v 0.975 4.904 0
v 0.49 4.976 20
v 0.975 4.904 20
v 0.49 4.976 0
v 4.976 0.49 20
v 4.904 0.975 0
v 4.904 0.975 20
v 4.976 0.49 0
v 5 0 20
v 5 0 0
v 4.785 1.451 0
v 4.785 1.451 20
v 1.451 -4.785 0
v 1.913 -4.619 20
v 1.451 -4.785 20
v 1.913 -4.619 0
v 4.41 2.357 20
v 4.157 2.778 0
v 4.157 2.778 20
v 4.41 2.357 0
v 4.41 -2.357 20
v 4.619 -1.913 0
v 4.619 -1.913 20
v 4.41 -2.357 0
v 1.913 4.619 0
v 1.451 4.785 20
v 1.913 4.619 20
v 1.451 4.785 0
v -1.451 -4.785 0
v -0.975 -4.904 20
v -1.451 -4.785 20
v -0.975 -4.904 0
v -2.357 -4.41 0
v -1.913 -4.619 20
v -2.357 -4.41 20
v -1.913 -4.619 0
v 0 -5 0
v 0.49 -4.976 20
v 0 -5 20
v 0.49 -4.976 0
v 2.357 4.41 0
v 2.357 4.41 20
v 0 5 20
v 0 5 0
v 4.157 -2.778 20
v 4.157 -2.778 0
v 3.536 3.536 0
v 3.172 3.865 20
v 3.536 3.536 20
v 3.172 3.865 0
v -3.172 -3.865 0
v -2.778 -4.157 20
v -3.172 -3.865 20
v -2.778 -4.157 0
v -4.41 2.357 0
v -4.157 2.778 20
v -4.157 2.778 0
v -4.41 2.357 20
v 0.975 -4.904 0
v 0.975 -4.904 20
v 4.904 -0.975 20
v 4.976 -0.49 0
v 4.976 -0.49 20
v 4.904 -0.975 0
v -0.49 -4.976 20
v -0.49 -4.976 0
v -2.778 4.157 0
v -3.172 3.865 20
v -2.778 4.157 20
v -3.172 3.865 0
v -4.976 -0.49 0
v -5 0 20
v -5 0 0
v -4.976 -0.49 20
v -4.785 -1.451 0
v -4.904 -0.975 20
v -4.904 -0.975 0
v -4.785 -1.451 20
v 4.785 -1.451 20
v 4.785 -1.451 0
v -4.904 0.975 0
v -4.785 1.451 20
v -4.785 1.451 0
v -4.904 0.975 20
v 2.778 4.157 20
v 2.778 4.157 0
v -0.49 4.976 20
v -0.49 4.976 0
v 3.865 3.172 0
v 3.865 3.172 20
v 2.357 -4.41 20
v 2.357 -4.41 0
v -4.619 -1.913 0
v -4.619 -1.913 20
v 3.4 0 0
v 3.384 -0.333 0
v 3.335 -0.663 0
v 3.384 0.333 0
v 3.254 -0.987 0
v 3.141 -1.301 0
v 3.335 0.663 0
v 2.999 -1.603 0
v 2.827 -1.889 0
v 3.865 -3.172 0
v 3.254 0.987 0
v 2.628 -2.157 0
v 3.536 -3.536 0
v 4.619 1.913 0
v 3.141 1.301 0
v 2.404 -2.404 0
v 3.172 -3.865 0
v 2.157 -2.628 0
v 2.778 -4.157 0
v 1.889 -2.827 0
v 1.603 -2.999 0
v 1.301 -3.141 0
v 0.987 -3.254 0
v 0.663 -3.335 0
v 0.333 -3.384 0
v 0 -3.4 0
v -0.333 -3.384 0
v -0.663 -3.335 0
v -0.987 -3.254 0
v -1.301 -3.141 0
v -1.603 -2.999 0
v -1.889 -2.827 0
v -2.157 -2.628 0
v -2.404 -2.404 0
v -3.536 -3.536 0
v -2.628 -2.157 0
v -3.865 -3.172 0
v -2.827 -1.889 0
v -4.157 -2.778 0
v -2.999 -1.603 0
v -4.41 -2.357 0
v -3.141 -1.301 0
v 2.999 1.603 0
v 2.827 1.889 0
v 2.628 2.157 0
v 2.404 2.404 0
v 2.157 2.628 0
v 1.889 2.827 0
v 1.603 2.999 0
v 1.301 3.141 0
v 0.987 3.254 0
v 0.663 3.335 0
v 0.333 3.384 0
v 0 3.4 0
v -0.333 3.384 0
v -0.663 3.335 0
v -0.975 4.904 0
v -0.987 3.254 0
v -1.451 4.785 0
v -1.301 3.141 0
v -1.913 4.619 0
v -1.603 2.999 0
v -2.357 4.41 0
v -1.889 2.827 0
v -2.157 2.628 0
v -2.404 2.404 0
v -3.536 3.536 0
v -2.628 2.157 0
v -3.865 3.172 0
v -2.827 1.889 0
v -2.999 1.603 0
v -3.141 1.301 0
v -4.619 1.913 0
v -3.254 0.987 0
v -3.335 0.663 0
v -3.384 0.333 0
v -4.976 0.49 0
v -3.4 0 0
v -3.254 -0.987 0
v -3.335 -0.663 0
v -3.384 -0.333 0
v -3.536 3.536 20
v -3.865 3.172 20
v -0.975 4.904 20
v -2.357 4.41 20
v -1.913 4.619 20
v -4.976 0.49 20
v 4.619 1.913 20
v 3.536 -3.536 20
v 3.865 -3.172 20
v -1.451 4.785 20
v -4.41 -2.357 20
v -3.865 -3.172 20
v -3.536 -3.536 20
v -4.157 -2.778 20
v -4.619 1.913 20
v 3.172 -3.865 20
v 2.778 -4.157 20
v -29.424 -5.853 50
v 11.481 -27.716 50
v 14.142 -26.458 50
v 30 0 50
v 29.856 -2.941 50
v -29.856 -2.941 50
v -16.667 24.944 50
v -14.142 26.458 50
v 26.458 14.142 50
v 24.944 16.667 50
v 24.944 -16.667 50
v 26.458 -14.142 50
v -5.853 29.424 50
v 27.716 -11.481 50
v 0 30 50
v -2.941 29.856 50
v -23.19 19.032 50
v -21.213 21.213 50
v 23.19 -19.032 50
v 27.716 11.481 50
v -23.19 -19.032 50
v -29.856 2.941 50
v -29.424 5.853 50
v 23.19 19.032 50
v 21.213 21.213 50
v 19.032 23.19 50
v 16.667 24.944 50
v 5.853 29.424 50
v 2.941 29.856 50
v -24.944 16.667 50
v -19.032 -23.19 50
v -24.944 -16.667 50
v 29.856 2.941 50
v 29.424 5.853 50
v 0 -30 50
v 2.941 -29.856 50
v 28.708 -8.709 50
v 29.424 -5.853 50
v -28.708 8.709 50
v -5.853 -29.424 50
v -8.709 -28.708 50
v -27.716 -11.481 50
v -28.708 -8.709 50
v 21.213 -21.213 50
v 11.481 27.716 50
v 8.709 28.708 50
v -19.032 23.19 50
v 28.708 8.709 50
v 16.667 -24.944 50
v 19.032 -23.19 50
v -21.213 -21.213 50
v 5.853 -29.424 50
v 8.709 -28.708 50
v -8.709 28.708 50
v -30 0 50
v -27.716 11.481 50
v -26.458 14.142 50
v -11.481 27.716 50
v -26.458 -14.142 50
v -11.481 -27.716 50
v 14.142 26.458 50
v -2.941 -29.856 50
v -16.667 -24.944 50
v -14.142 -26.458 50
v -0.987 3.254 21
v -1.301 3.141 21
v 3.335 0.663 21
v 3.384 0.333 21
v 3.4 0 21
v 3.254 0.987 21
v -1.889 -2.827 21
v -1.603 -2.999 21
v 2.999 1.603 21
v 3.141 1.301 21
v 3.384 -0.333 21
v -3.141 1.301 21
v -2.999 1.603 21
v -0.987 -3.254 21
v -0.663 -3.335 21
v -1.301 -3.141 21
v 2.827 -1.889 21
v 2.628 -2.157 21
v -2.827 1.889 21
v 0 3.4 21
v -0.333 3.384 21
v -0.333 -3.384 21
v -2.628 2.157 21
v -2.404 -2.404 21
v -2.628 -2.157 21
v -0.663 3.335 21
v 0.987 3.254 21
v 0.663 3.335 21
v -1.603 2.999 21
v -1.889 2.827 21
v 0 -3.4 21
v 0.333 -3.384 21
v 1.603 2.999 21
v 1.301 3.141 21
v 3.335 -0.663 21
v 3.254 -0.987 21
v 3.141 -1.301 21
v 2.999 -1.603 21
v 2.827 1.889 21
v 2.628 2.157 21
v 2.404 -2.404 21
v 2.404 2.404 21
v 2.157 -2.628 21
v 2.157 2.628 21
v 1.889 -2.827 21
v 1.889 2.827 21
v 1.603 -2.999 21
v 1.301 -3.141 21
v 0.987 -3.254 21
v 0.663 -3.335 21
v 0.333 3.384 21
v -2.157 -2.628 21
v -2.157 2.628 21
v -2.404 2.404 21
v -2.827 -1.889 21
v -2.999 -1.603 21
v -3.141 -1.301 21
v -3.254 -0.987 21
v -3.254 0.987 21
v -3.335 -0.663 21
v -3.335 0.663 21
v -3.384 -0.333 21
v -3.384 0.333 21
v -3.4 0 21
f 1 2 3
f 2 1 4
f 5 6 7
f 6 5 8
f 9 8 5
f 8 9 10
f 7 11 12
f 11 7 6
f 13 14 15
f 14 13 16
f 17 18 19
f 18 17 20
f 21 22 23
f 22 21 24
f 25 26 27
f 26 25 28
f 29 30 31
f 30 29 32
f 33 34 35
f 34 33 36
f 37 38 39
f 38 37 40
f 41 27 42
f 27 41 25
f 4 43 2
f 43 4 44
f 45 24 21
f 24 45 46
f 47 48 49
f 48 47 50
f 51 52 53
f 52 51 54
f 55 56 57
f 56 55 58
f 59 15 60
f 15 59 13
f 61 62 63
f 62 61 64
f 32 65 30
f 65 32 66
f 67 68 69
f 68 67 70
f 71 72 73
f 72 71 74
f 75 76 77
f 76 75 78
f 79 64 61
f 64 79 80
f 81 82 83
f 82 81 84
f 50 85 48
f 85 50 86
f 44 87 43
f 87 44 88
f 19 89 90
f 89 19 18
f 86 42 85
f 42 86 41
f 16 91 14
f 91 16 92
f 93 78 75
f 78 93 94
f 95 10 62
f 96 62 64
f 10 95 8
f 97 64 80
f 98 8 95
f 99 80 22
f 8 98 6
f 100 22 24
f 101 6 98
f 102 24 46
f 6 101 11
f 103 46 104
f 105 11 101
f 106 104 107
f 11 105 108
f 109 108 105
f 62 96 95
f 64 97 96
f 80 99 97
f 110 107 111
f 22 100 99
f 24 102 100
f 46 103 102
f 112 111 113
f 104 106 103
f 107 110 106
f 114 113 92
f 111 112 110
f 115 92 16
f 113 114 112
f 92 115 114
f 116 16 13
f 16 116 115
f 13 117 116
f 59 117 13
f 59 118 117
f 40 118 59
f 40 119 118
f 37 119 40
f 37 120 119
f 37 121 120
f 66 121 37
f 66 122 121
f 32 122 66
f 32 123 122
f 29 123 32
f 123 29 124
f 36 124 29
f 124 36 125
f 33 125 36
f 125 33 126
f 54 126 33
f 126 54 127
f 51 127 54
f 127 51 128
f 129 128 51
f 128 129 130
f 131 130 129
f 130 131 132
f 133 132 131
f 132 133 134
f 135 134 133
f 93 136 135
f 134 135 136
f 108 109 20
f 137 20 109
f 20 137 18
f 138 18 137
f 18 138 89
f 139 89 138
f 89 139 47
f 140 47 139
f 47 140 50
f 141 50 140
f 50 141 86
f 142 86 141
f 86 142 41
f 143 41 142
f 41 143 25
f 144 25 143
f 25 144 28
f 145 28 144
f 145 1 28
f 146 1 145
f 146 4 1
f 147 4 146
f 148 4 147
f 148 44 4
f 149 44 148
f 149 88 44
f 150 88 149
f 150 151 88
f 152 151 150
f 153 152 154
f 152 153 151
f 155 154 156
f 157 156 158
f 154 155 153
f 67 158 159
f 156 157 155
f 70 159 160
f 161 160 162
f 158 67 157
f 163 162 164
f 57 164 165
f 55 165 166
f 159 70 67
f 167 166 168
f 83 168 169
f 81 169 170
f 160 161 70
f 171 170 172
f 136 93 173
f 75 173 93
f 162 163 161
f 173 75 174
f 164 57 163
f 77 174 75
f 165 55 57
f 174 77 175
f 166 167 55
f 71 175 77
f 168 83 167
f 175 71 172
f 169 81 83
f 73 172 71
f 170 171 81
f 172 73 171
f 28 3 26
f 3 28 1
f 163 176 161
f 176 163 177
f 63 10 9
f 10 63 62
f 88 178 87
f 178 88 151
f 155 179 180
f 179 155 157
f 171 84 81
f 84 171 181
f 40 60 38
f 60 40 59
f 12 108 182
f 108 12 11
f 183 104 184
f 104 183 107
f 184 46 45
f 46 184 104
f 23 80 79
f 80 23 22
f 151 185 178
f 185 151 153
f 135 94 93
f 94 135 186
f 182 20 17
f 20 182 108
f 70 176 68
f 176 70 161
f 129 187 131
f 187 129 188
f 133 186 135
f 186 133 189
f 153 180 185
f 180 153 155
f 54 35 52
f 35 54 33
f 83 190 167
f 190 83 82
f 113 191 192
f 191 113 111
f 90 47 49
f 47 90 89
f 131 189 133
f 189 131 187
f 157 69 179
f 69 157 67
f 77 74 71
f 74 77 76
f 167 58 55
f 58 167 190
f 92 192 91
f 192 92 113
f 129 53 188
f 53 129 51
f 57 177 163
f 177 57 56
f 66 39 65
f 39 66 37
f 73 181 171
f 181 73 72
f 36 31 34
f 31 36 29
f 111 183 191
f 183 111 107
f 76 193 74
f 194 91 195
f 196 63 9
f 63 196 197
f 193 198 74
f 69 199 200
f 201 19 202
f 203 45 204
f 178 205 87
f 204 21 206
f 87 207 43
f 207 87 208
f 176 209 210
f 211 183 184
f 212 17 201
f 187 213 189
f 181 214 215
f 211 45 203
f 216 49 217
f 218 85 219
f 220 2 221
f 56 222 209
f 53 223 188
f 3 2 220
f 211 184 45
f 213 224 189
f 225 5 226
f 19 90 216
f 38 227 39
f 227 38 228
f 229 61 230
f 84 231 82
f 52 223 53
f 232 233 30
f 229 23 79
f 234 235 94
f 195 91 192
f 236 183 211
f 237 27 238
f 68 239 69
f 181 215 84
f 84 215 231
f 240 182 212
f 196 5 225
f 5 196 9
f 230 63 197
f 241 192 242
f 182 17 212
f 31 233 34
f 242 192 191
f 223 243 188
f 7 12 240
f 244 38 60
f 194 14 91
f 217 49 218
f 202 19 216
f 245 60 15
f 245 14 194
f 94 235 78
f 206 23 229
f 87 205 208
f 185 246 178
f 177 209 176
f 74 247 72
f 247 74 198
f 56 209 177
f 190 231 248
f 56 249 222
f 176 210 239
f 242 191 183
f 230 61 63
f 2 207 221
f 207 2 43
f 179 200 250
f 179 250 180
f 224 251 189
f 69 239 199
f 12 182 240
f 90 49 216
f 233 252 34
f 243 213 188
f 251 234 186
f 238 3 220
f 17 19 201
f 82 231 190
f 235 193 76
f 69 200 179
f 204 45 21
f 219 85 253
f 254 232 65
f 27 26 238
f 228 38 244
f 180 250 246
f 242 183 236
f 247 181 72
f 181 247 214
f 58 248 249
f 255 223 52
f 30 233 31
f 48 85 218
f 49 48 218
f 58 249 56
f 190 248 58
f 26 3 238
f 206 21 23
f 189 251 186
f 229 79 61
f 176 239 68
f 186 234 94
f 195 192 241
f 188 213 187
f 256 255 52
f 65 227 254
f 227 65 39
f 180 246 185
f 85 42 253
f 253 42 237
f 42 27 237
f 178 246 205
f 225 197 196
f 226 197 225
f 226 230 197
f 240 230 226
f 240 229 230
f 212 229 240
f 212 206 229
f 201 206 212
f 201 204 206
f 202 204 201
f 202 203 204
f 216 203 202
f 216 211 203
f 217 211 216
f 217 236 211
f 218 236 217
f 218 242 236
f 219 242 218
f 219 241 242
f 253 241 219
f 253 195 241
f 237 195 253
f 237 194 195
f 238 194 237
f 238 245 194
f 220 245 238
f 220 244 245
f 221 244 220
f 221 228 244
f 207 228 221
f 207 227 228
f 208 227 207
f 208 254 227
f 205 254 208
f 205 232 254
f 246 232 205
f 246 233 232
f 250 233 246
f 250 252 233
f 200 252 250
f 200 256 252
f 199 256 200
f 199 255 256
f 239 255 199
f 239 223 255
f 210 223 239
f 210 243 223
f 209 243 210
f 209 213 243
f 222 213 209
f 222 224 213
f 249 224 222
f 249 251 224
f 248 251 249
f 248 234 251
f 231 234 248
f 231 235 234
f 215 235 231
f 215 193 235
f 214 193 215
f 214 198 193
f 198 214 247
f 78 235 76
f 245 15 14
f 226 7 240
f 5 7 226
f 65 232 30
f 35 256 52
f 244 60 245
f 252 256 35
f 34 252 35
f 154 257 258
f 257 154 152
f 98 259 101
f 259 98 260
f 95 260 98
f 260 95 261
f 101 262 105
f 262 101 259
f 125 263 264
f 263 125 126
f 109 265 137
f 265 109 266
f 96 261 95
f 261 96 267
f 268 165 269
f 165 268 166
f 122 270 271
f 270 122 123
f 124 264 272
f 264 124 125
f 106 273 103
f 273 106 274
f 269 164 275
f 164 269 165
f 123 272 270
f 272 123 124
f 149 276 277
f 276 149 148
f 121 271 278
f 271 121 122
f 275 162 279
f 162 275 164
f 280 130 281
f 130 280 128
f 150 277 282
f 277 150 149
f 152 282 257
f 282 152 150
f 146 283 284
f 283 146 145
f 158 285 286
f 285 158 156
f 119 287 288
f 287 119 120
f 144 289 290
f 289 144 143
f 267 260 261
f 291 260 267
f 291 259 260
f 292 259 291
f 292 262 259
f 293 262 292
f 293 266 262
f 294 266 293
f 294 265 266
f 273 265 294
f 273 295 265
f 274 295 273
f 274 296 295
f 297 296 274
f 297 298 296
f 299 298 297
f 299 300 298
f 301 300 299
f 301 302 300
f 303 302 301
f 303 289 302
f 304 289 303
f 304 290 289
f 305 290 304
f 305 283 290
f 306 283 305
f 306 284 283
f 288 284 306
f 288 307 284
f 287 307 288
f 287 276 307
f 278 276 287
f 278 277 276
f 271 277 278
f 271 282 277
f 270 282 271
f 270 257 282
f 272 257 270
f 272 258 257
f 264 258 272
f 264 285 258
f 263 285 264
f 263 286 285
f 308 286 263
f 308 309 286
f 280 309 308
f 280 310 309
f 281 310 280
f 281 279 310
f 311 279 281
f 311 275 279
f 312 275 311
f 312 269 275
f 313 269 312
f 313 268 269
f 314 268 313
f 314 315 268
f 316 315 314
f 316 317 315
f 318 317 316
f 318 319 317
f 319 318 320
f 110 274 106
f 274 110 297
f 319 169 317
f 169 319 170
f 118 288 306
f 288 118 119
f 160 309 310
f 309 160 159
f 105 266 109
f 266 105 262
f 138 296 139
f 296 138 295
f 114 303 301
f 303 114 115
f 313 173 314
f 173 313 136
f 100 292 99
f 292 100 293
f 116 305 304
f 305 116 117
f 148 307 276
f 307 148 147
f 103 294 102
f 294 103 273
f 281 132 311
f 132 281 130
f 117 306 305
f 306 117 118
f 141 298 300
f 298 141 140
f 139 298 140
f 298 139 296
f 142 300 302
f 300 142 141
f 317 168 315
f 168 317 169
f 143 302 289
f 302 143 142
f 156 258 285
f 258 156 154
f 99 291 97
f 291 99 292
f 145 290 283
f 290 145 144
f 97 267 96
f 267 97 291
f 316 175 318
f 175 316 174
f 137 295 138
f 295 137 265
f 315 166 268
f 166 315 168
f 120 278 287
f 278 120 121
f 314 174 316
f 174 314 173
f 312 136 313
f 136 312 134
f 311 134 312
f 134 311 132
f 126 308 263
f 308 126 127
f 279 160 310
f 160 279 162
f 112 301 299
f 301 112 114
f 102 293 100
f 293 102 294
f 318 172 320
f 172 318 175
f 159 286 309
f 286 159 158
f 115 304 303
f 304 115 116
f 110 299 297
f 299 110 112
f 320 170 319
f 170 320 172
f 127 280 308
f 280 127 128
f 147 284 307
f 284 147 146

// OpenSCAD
// Funnel - a straight spout (tube) with a conical bowl, open at both ends, for pouring
// liquids in the lab. NOVEL general part.
//

spout_d = 10;
spout_l = 20;
cone_d  = 60;
rim     = 50;
wall    = 1.6;

$fn = 64;

ib = spout_d - 2 * wall;   // bore of the spout

difference() {
    union() {
        cylinder(h = spout_l, d = spout_d);          // spout
        translate([0, 0, spout_l]) cylinder(h = 30, d1 = spout_d, d2 = cone_d);  // cone (flared mouth)
        translate([0, 0, spout_l]) cylinder(h = 30, d1 = ib, d2 = cone_d - 2 * wall);  // inner cone, open mouth
    }
    translate([0, 0, -1]) cylinder(h = spout_l + 2, d = ib);  // bore through the spout
}
